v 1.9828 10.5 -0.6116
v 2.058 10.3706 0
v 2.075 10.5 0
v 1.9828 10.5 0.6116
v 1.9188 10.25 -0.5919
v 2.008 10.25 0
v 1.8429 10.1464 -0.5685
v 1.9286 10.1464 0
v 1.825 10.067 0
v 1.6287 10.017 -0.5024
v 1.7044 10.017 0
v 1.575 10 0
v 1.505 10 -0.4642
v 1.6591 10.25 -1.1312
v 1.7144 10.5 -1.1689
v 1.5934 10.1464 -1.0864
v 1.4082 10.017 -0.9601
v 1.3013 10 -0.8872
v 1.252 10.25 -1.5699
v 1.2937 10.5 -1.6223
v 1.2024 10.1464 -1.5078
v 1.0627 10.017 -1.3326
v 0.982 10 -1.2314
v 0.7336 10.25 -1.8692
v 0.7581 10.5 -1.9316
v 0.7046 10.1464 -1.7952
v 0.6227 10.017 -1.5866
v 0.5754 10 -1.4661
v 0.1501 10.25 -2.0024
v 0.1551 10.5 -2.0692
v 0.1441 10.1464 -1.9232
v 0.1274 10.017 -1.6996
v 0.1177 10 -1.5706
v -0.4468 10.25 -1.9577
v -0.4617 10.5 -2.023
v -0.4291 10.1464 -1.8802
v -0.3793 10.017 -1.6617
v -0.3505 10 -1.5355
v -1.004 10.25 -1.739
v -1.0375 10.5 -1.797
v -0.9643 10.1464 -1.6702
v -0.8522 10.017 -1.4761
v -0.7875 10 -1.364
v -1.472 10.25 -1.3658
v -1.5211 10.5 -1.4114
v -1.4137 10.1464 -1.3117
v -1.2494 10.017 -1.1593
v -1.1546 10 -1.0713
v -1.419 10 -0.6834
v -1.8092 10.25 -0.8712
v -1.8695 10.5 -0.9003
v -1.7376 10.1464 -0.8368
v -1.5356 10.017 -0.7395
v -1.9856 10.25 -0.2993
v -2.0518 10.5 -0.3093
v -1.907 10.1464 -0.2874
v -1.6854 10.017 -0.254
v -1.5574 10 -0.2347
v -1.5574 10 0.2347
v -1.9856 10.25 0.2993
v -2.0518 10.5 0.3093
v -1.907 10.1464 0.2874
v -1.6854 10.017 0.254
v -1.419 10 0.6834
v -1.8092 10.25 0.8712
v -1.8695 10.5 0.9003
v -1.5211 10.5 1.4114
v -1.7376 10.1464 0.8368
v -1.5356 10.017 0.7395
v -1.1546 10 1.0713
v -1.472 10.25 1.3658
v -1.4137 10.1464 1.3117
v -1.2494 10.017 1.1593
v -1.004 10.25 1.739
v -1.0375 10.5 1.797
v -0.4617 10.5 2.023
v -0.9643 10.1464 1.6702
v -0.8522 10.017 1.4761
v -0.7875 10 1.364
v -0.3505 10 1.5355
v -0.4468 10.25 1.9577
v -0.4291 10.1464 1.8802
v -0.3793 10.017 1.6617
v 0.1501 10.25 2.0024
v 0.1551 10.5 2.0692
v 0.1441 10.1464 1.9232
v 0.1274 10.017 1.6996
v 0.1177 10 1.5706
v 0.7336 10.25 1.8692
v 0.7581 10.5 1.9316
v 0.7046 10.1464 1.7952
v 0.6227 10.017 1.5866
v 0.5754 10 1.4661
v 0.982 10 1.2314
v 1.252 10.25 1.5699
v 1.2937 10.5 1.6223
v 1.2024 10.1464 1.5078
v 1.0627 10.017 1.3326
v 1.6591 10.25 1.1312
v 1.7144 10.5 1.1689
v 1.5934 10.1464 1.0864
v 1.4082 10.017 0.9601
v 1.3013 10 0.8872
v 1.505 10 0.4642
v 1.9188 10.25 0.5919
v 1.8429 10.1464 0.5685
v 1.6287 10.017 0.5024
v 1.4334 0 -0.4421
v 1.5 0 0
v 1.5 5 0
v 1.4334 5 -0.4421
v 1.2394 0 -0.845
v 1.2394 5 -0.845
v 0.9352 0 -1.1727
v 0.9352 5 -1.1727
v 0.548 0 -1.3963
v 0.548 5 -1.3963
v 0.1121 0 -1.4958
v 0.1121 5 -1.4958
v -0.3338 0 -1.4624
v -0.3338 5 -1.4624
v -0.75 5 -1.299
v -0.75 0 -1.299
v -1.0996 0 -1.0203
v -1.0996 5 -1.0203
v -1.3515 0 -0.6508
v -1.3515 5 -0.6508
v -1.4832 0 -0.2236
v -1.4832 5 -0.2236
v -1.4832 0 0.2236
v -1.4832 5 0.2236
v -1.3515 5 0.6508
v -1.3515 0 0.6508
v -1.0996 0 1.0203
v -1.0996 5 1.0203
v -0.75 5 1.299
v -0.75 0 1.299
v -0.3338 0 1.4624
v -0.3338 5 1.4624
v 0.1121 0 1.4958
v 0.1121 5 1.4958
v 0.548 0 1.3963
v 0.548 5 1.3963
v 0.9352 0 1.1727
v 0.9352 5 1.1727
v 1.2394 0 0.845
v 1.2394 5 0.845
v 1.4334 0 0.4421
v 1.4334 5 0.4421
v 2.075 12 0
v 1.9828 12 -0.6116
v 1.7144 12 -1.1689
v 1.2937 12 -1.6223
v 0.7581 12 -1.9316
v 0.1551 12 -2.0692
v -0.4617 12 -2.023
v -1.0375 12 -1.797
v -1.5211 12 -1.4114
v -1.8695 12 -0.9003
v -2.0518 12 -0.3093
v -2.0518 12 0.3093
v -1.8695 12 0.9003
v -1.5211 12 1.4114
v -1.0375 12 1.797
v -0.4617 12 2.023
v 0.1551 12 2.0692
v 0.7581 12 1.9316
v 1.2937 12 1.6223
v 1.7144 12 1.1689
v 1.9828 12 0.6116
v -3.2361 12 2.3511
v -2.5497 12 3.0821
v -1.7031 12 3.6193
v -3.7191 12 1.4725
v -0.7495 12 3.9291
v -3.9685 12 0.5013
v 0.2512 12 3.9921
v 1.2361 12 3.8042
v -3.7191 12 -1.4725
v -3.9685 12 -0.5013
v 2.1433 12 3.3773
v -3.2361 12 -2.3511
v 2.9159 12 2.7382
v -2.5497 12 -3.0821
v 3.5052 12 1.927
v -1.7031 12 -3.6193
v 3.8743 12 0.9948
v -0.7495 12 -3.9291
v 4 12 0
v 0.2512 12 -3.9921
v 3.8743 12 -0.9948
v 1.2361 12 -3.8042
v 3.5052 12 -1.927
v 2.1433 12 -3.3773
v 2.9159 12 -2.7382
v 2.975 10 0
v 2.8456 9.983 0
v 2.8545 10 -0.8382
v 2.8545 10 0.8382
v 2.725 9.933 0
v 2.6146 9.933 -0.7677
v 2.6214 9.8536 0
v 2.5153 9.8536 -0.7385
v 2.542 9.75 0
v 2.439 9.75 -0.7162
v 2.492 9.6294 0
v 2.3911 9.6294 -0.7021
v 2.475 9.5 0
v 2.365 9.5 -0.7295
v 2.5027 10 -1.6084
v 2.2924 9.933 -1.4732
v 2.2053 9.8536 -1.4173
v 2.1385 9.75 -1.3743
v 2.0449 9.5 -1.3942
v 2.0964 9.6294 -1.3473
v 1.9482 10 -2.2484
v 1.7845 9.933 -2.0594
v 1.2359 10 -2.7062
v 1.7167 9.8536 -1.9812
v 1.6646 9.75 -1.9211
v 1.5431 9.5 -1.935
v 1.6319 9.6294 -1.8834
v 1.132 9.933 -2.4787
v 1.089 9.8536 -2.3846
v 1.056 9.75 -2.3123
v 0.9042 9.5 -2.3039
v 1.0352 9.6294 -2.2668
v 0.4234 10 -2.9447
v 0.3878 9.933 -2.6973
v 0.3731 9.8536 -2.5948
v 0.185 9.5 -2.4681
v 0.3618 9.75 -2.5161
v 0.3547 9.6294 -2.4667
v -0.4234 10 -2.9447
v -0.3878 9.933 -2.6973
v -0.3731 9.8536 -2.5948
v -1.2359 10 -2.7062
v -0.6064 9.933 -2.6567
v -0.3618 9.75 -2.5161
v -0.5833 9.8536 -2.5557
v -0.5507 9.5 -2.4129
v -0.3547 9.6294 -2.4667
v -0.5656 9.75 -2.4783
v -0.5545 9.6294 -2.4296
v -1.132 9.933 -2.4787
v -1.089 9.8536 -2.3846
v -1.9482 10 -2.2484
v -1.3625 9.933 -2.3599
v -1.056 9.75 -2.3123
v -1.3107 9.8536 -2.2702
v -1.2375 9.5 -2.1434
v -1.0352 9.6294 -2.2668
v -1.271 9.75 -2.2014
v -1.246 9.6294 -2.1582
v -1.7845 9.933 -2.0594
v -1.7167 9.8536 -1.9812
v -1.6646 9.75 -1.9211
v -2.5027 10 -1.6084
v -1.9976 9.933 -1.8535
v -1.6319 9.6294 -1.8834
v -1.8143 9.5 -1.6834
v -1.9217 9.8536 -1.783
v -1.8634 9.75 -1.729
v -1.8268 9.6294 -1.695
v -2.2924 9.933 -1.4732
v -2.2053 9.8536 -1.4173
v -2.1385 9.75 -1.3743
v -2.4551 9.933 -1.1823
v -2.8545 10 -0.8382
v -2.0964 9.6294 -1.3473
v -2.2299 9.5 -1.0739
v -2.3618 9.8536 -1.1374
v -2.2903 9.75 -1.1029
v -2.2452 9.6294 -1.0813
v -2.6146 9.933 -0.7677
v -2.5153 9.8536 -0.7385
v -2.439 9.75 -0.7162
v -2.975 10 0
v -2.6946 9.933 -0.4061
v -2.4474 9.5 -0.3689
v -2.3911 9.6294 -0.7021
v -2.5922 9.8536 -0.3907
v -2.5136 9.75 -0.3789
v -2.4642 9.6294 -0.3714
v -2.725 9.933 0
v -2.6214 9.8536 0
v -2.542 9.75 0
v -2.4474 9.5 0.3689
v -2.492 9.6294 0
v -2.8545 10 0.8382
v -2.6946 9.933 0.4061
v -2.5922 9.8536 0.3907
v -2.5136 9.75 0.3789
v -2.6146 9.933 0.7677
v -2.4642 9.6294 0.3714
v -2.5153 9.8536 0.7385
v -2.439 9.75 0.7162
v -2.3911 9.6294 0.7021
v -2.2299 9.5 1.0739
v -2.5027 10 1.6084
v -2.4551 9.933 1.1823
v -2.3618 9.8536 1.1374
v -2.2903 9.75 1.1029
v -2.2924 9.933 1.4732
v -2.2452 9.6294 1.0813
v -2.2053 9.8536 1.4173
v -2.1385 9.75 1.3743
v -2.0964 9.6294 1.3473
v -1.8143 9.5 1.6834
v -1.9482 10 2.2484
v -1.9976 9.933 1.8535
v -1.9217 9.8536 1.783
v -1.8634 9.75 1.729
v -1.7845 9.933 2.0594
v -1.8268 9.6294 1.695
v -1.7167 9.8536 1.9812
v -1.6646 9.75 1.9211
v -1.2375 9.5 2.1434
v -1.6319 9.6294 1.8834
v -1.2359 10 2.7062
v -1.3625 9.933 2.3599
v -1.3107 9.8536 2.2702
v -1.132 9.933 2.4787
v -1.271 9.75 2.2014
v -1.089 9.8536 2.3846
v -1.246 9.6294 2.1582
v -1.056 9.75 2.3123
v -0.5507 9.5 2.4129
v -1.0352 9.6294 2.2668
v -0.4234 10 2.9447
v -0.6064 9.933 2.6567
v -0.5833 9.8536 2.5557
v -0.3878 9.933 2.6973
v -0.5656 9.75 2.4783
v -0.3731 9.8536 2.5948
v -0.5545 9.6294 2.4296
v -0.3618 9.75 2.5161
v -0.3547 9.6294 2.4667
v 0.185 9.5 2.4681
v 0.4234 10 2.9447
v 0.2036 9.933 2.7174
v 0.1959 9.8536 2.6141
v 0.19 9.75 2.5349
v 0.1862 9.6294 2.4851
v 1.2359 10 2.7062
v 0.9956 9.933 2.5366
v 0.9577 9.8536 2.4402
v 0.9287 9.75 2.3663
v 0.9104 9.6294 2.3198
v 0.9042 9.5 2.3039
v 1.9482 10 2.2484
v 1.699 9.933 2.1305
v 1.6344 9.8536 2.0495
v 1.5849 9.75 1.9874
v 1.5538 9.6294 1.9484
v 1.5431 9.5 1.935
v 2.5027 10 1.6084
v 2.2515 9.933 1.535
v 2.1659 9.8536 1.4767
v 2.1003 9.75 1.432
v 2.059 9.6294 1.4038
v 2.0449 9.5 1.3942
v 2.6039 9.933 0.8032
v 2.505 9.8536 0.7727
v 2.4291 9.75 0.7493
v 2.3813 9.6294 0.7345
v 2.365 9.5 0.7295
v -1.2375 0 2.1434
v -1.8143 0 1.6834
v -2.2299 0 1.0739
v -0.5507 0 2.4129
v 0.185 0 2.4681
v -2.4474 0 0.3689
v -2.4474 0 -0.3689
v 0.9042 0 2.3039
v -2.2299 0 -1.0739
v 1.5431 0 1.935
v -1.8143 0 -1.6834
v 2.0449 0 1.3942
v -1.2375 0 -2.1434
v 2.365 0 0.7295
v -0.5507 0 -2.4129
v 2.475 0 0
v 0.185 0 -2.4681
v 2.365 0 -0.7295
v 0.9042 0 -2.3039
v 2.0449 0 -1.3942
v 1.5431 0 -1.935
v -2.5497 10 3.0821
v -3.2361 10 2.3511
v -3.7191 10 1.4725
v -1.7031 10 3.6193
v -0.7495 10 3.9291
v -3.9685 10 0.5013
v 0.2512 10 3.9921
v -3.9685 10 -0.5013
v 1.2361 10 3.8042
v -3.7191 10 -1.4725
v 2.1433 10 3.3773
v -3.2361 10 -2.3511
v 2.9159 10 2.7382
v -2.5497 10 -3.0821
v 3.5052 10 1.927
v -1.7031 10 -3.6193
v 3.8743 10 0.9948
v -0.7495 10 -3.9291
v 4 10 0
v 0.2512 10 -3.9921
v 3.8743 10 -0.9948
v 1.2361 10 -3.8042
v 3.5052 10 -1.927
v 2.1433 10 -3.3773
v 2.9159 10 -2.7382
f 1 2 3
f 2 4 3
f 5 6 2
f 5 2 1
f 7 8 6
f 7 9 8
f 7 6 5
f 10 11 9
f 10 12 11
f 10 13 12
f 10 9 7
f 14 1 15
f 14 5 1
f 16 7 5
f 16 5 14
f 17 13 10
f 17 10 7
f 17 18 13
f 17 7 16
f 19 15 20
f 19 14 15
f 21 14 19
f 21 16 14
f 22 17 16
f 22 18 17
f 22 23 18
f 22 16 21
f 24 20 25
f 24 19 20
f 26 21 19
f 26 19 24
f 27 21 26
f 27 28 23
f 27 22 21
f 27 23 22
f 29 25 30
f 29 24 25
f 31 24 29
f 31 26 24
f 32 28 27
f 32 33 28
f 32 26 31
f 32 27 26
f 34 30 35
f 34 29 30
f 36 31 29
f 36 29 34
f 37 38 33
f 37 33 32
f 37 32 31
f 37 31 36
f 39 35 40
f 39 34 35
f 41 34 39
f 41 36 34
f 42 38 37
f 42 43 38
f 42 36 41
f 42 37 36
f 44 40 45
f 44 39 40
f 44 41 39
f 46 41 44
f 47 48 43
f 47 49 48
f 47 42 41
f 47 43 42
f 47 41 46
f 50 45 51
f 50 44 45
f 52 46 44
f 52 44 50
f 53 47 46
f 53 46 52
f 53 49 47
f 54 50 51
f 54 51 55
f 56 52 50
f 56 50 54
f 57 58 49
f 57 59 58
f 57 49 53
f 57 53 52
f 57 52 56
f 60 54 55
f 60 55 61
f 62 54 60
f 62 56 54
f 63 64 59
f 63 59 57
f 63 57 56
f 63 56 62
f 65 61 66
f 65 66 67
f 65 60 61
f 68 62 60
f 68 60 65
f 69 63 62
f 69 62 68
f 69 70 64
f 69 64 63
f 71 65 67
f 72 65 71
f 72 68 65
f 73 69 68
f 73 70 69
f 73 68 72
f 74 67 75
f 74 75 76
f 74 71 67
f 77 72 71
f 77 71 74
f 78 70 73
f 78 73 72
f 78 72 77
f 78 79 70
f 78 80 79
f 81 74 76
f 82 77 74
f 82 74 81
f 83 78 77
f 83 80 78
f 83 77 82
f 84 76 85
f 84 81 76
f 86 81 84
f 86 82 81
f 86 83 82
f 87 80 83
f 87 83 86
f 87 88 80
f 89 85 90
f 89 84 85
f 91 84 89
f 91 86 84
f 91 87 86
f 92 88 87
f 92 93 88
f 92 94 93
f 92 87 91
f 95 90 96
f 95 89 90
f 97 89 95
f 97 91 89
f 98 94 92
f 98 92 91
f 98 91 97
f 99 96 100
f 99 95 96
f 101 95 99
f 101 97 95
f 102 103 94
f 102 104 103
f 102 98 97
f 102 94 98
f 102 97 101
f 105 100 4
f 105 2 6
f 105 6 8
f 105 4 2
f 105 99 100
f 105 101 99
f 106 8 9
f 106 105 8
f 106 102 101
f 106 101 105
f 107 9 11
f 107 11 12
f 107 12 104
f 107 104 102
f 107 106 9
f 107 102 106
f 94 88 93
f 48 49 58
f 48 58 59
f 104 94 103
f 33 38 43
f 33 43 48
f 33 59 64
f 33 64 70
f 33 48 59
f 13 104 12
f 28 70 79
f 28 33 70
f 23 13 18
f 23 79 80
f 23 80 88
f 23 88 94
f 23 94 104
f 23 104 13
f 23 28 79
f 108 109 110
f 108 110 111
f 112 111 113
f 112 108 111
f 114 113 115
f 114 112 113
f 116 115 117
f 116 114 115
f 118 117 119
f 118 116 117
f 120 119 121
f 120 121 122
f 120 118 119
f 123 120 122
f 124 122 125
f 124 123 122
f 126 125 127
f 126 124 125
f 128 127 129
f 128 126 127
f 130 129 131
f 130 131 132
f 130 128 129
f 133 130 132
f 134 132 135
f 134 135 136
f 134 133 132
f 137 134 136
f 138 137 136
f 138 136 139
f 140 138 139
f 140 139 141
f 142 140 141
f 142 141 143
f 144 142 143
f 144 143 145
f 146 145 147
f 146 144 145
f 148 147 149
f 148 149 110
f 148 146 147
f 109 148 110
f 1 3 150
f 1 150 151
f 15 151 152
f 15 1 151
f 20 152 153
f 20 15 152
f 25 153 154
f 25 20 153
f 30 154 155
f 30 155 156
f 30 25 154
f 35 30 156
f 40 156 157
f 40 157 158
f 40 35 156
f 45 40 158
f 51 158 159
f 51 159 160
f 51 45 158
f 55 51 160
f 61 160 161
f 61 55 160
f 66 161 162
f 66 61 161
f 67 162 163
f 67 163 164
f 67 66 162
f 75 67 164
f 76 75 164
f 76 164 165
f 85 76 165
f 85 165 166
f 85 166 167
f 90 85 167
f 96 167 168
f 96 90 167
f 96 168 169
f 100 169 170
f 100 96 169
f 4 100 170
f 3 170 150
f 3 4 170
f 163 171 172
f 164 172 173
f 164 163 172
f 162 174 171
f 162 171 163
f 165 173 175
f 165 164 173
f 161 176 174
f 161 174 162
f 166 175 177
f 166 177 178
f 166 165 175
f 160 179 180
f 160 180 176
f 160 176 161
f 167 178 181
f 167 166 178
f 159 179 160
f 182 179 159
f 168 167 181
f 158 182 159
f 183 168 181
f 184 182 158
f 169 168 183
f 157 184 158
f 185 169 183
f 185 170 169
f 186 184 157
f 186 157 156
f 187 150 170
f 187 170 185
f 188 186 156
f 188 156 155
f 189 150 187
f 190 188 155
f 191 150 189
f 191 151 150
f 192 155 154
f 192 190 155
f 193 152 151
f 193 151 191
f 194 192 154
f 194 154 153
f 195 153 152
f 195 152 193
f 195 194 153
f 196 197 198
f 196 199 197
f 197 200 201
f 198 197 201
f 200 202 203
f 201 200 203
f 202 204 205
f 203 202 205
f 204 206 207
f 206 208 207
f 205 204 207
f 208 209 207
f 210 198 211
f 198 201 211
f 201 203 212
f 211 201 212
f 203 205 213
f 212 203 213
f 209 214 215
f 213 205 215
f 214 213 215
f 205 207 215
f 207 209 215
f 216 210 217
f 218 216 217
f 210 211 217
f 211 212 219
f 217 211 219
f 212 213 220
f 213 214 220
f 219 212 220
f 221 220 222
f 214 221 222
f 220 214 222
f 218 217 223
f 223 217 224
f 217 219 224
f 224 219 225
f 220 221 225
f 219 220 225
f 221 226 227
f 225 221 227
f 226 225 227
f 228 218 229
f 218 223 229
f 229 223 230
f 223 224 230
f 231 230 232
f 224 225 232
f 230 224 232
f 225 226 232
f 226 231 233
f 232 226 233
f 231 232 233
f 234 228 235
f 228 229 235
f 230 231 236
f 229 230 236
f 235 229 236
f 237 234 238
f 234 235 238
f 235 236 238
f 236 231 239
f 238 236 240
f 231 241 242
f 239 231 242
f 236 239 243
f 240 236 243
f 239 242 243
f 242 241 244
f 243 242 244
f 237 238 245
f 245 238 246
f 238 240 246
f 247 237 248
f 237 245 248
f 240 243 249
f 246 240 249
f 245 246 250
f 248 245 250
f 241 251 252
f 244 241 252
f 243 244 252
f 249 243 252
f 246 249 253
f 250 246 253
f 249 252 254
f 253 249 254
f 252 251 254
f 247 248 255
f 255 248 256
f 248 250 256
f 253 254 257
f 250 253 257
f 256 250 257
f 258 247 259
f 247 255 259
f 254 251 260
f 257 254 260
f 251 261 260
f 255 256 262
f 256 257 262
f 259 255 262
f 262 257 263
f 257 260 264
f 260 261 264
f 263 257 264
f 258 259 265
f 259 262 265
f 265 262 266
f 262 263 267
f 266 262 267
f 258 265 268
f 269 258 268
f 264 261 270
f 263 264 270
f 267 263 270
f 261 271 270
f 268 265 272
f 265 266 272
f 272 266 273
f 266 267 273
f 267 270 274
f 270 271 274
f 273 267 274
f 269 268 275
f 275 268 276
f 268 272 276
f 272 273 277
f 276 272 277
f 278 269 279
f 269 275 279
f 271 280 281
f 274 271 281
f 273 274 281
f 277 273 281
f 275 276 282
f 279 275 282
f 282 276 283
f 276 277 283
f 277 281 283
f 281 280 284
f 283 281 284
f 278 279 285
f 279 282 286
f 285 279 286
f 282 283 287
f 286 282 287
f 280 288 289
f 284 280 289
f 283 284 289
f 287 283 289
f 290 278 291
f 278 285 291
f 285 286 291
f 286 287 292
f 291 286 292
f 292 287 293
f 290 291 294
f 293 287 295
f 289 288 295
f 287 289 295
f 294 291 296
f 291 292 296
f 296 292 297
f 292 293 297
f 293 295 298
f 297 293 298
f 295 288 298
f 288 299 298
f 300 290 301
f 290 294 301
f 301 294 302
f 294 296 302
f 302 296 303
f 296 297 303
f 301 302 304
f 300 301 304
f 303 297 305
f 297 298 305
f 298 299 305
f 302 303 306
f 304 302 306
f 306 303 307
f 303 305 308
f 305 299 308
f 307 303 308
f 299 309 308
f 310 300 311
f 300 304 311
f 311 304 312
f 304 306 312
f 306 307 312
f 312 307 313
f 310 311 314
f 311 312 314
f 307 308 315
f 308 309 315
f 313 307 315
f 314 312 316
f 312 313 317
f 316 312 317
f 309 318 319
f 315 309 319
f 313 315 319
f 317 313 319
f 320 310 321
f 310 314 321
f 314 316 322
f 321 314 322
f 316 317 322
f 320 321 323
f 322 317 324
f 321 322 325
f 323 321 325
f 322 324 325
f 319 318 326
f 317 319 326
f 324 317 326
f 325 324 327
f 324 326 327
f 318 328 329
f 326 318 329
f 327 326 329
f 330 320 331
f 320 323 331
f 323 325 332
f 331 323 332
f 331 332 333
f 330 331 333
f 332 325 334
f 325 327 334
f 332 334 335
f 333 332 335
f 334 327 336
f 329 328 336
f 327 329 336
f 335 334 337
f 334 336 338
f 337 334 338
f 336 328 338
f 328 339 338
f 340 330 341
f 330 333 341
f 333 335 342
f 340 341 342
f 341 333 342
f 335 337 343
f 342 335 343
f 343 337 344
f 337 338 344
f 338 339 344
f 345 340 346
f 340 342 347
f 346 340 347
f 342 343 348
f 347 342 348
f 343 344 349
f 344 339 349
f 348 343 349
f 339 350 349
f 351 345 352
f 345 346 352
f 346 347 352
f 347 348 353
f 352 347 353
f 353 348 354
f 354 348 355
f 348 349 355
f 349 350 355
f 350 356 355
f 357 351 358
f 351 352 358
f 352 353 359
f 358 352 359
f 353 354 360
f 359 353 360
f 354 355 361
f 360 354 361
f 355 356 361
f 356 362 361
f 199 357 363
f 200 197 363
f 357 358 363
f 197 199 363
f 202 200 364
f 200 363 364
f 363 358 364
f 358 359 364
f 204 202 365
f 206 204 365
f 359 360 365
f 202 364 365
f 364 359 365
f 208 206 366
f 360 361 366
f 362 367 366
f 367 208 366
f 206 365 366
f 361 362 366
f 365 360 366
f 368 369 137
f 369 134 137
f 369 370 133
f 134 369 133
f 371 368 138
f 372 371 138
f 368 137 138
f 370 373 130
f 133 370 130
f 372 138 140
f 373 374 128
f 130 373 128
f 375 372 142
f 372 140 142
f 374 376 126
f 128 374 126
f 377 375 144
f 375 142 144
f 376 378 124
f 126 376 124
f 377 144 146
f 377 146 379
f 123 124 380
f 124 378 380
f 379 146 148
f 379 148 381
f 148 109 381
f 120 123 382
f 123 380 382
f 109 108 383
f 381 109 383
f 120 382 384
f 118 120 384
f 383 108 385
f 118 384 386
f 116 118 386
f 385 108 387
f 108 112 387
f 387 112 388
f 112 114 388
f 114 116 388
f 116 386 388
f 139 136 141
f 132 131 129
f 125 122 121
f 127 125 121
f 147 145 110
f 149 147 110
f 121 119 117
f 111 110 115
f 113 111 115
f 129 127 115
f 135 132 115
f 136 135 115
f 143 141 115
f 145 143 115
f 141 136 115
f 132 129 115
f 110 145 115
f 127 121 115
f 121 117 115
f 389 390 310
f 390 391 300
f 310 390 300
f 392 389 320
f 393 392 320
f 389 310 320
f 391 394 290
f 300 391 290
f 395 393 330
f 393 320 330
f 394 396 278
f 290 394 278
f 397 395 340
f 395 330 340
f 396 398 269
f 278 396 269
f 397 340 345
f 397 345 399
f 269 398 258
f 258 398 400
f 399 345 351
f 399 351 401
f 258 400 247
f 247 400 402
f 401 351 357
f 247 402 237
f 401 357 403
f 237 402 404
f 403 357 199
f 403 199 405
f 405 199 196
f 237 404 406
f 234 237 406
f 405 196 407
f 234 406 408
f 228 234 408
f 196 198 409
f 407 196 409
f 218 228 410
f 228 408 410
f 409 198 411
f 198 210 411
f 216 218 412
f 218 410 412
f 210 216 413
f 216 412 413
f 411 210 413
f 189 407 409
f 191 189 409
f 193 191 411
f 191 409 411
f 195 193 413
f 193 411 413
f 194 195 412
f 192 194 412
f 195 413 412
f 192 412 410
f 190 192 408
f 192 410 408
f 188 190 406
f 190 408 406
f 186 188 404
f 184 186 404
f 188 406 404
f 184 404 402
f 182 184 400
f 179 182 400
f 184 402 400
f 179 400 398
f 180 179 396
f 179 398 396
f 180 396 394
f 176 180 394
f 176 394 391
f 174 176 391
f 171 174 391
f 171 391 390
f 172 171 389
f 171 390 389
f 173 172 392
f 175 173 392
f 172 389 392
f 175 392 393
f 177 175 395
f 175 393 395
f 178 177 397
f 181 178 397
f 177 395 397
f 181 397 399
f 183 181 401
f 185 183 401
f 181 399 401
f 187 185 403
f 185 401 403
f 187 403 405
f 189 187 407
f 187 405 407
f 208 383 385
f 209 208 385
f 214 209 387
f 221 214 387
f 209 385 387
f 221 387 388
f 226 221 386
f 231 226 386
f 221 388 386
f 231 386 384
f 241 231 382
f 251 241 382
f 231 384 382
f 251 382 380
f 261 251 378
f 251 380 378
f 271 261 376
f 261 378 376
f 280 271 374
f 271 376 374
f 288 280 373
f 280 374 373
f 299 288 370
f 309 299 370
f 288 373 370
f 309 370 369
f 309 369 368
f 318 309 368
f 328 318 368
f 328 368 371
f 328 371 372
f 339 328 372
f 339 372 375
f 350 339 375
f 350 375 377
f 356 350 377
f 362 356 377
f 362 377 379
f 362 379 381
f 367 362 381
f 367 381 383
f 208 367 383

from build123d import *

# Parameters (mm, degrees)
SKETCH1_R           = 2.475
SKETCH1_R_2         = 1.5
BOSS_EXTRUDE1_DEPTH = 5
BOSS_EXTRUDE2_START = 5
SKETCH1_2_R         = 2.475
SKETCH1_2_R_2       = 1.5
BOSS_EXTRUDE2_DEPTH = 5
SKETCH2_R           = 4
SKETCH2_R_2         = 2.075
BOSS_EXTRUDE3_DEPTH = 2
FILLET1_R           = 0.5


with BuildPart() as part:
    # Sketch1 → Boss-Extrude1 (new body)
    with BuildSketch(Plane(origin=(0, 0, 0), x_dir=(1, 0, 0), z_dir=(0, 1, 0))):
        Circle(SKETCH1_R)
        Circle(SKETCH1_R_2, mode=Mode.SUBTRACT)
    extrude(amount=BOSS_EXTRUDE1_DEPTH)

    # Sketch1<2> → Boss-Extrude2 (add)
    with BuildSketch(Plane(origin=(0, 0, 0), x_dir=(1, 0, 0), z_dir=(0, 1, 0)).offset(BOSS_EXTRUDE2_START)):
        Circle(SKETCH1_2_R)
        Circle(SKETCH1_2_R_2, mode=Mode.SUBTRACT)
        Circle(SKETCH1_2_R_2)
    extrude(amount=BOSS_EXTRUDE2_DEPTH)

    # Sketch2 → Boss-Extrude3 (add)
    with BuildSketch(Plane(origin=(0, 10, 0), x_dir=(1, 0, 0), z_dir=(0, 1, 0))):
        Circle(SKETCH2_R)
        Circle(SKETCH2_R_2, mode=Mode.SUBTRACT)
    extrude(amount=BOSS_EXTRUDE3_DEPTH)

    # Fillet1
    fillet1_edges = [part.edges().sort_by_distance(p)[0] for p in [
        (-2.475, 10, 0),
        (-2.075, 10, 0),
    ]]
    fillet(fillet1_edges, radius=FILLET1_R)


solid = part.part
